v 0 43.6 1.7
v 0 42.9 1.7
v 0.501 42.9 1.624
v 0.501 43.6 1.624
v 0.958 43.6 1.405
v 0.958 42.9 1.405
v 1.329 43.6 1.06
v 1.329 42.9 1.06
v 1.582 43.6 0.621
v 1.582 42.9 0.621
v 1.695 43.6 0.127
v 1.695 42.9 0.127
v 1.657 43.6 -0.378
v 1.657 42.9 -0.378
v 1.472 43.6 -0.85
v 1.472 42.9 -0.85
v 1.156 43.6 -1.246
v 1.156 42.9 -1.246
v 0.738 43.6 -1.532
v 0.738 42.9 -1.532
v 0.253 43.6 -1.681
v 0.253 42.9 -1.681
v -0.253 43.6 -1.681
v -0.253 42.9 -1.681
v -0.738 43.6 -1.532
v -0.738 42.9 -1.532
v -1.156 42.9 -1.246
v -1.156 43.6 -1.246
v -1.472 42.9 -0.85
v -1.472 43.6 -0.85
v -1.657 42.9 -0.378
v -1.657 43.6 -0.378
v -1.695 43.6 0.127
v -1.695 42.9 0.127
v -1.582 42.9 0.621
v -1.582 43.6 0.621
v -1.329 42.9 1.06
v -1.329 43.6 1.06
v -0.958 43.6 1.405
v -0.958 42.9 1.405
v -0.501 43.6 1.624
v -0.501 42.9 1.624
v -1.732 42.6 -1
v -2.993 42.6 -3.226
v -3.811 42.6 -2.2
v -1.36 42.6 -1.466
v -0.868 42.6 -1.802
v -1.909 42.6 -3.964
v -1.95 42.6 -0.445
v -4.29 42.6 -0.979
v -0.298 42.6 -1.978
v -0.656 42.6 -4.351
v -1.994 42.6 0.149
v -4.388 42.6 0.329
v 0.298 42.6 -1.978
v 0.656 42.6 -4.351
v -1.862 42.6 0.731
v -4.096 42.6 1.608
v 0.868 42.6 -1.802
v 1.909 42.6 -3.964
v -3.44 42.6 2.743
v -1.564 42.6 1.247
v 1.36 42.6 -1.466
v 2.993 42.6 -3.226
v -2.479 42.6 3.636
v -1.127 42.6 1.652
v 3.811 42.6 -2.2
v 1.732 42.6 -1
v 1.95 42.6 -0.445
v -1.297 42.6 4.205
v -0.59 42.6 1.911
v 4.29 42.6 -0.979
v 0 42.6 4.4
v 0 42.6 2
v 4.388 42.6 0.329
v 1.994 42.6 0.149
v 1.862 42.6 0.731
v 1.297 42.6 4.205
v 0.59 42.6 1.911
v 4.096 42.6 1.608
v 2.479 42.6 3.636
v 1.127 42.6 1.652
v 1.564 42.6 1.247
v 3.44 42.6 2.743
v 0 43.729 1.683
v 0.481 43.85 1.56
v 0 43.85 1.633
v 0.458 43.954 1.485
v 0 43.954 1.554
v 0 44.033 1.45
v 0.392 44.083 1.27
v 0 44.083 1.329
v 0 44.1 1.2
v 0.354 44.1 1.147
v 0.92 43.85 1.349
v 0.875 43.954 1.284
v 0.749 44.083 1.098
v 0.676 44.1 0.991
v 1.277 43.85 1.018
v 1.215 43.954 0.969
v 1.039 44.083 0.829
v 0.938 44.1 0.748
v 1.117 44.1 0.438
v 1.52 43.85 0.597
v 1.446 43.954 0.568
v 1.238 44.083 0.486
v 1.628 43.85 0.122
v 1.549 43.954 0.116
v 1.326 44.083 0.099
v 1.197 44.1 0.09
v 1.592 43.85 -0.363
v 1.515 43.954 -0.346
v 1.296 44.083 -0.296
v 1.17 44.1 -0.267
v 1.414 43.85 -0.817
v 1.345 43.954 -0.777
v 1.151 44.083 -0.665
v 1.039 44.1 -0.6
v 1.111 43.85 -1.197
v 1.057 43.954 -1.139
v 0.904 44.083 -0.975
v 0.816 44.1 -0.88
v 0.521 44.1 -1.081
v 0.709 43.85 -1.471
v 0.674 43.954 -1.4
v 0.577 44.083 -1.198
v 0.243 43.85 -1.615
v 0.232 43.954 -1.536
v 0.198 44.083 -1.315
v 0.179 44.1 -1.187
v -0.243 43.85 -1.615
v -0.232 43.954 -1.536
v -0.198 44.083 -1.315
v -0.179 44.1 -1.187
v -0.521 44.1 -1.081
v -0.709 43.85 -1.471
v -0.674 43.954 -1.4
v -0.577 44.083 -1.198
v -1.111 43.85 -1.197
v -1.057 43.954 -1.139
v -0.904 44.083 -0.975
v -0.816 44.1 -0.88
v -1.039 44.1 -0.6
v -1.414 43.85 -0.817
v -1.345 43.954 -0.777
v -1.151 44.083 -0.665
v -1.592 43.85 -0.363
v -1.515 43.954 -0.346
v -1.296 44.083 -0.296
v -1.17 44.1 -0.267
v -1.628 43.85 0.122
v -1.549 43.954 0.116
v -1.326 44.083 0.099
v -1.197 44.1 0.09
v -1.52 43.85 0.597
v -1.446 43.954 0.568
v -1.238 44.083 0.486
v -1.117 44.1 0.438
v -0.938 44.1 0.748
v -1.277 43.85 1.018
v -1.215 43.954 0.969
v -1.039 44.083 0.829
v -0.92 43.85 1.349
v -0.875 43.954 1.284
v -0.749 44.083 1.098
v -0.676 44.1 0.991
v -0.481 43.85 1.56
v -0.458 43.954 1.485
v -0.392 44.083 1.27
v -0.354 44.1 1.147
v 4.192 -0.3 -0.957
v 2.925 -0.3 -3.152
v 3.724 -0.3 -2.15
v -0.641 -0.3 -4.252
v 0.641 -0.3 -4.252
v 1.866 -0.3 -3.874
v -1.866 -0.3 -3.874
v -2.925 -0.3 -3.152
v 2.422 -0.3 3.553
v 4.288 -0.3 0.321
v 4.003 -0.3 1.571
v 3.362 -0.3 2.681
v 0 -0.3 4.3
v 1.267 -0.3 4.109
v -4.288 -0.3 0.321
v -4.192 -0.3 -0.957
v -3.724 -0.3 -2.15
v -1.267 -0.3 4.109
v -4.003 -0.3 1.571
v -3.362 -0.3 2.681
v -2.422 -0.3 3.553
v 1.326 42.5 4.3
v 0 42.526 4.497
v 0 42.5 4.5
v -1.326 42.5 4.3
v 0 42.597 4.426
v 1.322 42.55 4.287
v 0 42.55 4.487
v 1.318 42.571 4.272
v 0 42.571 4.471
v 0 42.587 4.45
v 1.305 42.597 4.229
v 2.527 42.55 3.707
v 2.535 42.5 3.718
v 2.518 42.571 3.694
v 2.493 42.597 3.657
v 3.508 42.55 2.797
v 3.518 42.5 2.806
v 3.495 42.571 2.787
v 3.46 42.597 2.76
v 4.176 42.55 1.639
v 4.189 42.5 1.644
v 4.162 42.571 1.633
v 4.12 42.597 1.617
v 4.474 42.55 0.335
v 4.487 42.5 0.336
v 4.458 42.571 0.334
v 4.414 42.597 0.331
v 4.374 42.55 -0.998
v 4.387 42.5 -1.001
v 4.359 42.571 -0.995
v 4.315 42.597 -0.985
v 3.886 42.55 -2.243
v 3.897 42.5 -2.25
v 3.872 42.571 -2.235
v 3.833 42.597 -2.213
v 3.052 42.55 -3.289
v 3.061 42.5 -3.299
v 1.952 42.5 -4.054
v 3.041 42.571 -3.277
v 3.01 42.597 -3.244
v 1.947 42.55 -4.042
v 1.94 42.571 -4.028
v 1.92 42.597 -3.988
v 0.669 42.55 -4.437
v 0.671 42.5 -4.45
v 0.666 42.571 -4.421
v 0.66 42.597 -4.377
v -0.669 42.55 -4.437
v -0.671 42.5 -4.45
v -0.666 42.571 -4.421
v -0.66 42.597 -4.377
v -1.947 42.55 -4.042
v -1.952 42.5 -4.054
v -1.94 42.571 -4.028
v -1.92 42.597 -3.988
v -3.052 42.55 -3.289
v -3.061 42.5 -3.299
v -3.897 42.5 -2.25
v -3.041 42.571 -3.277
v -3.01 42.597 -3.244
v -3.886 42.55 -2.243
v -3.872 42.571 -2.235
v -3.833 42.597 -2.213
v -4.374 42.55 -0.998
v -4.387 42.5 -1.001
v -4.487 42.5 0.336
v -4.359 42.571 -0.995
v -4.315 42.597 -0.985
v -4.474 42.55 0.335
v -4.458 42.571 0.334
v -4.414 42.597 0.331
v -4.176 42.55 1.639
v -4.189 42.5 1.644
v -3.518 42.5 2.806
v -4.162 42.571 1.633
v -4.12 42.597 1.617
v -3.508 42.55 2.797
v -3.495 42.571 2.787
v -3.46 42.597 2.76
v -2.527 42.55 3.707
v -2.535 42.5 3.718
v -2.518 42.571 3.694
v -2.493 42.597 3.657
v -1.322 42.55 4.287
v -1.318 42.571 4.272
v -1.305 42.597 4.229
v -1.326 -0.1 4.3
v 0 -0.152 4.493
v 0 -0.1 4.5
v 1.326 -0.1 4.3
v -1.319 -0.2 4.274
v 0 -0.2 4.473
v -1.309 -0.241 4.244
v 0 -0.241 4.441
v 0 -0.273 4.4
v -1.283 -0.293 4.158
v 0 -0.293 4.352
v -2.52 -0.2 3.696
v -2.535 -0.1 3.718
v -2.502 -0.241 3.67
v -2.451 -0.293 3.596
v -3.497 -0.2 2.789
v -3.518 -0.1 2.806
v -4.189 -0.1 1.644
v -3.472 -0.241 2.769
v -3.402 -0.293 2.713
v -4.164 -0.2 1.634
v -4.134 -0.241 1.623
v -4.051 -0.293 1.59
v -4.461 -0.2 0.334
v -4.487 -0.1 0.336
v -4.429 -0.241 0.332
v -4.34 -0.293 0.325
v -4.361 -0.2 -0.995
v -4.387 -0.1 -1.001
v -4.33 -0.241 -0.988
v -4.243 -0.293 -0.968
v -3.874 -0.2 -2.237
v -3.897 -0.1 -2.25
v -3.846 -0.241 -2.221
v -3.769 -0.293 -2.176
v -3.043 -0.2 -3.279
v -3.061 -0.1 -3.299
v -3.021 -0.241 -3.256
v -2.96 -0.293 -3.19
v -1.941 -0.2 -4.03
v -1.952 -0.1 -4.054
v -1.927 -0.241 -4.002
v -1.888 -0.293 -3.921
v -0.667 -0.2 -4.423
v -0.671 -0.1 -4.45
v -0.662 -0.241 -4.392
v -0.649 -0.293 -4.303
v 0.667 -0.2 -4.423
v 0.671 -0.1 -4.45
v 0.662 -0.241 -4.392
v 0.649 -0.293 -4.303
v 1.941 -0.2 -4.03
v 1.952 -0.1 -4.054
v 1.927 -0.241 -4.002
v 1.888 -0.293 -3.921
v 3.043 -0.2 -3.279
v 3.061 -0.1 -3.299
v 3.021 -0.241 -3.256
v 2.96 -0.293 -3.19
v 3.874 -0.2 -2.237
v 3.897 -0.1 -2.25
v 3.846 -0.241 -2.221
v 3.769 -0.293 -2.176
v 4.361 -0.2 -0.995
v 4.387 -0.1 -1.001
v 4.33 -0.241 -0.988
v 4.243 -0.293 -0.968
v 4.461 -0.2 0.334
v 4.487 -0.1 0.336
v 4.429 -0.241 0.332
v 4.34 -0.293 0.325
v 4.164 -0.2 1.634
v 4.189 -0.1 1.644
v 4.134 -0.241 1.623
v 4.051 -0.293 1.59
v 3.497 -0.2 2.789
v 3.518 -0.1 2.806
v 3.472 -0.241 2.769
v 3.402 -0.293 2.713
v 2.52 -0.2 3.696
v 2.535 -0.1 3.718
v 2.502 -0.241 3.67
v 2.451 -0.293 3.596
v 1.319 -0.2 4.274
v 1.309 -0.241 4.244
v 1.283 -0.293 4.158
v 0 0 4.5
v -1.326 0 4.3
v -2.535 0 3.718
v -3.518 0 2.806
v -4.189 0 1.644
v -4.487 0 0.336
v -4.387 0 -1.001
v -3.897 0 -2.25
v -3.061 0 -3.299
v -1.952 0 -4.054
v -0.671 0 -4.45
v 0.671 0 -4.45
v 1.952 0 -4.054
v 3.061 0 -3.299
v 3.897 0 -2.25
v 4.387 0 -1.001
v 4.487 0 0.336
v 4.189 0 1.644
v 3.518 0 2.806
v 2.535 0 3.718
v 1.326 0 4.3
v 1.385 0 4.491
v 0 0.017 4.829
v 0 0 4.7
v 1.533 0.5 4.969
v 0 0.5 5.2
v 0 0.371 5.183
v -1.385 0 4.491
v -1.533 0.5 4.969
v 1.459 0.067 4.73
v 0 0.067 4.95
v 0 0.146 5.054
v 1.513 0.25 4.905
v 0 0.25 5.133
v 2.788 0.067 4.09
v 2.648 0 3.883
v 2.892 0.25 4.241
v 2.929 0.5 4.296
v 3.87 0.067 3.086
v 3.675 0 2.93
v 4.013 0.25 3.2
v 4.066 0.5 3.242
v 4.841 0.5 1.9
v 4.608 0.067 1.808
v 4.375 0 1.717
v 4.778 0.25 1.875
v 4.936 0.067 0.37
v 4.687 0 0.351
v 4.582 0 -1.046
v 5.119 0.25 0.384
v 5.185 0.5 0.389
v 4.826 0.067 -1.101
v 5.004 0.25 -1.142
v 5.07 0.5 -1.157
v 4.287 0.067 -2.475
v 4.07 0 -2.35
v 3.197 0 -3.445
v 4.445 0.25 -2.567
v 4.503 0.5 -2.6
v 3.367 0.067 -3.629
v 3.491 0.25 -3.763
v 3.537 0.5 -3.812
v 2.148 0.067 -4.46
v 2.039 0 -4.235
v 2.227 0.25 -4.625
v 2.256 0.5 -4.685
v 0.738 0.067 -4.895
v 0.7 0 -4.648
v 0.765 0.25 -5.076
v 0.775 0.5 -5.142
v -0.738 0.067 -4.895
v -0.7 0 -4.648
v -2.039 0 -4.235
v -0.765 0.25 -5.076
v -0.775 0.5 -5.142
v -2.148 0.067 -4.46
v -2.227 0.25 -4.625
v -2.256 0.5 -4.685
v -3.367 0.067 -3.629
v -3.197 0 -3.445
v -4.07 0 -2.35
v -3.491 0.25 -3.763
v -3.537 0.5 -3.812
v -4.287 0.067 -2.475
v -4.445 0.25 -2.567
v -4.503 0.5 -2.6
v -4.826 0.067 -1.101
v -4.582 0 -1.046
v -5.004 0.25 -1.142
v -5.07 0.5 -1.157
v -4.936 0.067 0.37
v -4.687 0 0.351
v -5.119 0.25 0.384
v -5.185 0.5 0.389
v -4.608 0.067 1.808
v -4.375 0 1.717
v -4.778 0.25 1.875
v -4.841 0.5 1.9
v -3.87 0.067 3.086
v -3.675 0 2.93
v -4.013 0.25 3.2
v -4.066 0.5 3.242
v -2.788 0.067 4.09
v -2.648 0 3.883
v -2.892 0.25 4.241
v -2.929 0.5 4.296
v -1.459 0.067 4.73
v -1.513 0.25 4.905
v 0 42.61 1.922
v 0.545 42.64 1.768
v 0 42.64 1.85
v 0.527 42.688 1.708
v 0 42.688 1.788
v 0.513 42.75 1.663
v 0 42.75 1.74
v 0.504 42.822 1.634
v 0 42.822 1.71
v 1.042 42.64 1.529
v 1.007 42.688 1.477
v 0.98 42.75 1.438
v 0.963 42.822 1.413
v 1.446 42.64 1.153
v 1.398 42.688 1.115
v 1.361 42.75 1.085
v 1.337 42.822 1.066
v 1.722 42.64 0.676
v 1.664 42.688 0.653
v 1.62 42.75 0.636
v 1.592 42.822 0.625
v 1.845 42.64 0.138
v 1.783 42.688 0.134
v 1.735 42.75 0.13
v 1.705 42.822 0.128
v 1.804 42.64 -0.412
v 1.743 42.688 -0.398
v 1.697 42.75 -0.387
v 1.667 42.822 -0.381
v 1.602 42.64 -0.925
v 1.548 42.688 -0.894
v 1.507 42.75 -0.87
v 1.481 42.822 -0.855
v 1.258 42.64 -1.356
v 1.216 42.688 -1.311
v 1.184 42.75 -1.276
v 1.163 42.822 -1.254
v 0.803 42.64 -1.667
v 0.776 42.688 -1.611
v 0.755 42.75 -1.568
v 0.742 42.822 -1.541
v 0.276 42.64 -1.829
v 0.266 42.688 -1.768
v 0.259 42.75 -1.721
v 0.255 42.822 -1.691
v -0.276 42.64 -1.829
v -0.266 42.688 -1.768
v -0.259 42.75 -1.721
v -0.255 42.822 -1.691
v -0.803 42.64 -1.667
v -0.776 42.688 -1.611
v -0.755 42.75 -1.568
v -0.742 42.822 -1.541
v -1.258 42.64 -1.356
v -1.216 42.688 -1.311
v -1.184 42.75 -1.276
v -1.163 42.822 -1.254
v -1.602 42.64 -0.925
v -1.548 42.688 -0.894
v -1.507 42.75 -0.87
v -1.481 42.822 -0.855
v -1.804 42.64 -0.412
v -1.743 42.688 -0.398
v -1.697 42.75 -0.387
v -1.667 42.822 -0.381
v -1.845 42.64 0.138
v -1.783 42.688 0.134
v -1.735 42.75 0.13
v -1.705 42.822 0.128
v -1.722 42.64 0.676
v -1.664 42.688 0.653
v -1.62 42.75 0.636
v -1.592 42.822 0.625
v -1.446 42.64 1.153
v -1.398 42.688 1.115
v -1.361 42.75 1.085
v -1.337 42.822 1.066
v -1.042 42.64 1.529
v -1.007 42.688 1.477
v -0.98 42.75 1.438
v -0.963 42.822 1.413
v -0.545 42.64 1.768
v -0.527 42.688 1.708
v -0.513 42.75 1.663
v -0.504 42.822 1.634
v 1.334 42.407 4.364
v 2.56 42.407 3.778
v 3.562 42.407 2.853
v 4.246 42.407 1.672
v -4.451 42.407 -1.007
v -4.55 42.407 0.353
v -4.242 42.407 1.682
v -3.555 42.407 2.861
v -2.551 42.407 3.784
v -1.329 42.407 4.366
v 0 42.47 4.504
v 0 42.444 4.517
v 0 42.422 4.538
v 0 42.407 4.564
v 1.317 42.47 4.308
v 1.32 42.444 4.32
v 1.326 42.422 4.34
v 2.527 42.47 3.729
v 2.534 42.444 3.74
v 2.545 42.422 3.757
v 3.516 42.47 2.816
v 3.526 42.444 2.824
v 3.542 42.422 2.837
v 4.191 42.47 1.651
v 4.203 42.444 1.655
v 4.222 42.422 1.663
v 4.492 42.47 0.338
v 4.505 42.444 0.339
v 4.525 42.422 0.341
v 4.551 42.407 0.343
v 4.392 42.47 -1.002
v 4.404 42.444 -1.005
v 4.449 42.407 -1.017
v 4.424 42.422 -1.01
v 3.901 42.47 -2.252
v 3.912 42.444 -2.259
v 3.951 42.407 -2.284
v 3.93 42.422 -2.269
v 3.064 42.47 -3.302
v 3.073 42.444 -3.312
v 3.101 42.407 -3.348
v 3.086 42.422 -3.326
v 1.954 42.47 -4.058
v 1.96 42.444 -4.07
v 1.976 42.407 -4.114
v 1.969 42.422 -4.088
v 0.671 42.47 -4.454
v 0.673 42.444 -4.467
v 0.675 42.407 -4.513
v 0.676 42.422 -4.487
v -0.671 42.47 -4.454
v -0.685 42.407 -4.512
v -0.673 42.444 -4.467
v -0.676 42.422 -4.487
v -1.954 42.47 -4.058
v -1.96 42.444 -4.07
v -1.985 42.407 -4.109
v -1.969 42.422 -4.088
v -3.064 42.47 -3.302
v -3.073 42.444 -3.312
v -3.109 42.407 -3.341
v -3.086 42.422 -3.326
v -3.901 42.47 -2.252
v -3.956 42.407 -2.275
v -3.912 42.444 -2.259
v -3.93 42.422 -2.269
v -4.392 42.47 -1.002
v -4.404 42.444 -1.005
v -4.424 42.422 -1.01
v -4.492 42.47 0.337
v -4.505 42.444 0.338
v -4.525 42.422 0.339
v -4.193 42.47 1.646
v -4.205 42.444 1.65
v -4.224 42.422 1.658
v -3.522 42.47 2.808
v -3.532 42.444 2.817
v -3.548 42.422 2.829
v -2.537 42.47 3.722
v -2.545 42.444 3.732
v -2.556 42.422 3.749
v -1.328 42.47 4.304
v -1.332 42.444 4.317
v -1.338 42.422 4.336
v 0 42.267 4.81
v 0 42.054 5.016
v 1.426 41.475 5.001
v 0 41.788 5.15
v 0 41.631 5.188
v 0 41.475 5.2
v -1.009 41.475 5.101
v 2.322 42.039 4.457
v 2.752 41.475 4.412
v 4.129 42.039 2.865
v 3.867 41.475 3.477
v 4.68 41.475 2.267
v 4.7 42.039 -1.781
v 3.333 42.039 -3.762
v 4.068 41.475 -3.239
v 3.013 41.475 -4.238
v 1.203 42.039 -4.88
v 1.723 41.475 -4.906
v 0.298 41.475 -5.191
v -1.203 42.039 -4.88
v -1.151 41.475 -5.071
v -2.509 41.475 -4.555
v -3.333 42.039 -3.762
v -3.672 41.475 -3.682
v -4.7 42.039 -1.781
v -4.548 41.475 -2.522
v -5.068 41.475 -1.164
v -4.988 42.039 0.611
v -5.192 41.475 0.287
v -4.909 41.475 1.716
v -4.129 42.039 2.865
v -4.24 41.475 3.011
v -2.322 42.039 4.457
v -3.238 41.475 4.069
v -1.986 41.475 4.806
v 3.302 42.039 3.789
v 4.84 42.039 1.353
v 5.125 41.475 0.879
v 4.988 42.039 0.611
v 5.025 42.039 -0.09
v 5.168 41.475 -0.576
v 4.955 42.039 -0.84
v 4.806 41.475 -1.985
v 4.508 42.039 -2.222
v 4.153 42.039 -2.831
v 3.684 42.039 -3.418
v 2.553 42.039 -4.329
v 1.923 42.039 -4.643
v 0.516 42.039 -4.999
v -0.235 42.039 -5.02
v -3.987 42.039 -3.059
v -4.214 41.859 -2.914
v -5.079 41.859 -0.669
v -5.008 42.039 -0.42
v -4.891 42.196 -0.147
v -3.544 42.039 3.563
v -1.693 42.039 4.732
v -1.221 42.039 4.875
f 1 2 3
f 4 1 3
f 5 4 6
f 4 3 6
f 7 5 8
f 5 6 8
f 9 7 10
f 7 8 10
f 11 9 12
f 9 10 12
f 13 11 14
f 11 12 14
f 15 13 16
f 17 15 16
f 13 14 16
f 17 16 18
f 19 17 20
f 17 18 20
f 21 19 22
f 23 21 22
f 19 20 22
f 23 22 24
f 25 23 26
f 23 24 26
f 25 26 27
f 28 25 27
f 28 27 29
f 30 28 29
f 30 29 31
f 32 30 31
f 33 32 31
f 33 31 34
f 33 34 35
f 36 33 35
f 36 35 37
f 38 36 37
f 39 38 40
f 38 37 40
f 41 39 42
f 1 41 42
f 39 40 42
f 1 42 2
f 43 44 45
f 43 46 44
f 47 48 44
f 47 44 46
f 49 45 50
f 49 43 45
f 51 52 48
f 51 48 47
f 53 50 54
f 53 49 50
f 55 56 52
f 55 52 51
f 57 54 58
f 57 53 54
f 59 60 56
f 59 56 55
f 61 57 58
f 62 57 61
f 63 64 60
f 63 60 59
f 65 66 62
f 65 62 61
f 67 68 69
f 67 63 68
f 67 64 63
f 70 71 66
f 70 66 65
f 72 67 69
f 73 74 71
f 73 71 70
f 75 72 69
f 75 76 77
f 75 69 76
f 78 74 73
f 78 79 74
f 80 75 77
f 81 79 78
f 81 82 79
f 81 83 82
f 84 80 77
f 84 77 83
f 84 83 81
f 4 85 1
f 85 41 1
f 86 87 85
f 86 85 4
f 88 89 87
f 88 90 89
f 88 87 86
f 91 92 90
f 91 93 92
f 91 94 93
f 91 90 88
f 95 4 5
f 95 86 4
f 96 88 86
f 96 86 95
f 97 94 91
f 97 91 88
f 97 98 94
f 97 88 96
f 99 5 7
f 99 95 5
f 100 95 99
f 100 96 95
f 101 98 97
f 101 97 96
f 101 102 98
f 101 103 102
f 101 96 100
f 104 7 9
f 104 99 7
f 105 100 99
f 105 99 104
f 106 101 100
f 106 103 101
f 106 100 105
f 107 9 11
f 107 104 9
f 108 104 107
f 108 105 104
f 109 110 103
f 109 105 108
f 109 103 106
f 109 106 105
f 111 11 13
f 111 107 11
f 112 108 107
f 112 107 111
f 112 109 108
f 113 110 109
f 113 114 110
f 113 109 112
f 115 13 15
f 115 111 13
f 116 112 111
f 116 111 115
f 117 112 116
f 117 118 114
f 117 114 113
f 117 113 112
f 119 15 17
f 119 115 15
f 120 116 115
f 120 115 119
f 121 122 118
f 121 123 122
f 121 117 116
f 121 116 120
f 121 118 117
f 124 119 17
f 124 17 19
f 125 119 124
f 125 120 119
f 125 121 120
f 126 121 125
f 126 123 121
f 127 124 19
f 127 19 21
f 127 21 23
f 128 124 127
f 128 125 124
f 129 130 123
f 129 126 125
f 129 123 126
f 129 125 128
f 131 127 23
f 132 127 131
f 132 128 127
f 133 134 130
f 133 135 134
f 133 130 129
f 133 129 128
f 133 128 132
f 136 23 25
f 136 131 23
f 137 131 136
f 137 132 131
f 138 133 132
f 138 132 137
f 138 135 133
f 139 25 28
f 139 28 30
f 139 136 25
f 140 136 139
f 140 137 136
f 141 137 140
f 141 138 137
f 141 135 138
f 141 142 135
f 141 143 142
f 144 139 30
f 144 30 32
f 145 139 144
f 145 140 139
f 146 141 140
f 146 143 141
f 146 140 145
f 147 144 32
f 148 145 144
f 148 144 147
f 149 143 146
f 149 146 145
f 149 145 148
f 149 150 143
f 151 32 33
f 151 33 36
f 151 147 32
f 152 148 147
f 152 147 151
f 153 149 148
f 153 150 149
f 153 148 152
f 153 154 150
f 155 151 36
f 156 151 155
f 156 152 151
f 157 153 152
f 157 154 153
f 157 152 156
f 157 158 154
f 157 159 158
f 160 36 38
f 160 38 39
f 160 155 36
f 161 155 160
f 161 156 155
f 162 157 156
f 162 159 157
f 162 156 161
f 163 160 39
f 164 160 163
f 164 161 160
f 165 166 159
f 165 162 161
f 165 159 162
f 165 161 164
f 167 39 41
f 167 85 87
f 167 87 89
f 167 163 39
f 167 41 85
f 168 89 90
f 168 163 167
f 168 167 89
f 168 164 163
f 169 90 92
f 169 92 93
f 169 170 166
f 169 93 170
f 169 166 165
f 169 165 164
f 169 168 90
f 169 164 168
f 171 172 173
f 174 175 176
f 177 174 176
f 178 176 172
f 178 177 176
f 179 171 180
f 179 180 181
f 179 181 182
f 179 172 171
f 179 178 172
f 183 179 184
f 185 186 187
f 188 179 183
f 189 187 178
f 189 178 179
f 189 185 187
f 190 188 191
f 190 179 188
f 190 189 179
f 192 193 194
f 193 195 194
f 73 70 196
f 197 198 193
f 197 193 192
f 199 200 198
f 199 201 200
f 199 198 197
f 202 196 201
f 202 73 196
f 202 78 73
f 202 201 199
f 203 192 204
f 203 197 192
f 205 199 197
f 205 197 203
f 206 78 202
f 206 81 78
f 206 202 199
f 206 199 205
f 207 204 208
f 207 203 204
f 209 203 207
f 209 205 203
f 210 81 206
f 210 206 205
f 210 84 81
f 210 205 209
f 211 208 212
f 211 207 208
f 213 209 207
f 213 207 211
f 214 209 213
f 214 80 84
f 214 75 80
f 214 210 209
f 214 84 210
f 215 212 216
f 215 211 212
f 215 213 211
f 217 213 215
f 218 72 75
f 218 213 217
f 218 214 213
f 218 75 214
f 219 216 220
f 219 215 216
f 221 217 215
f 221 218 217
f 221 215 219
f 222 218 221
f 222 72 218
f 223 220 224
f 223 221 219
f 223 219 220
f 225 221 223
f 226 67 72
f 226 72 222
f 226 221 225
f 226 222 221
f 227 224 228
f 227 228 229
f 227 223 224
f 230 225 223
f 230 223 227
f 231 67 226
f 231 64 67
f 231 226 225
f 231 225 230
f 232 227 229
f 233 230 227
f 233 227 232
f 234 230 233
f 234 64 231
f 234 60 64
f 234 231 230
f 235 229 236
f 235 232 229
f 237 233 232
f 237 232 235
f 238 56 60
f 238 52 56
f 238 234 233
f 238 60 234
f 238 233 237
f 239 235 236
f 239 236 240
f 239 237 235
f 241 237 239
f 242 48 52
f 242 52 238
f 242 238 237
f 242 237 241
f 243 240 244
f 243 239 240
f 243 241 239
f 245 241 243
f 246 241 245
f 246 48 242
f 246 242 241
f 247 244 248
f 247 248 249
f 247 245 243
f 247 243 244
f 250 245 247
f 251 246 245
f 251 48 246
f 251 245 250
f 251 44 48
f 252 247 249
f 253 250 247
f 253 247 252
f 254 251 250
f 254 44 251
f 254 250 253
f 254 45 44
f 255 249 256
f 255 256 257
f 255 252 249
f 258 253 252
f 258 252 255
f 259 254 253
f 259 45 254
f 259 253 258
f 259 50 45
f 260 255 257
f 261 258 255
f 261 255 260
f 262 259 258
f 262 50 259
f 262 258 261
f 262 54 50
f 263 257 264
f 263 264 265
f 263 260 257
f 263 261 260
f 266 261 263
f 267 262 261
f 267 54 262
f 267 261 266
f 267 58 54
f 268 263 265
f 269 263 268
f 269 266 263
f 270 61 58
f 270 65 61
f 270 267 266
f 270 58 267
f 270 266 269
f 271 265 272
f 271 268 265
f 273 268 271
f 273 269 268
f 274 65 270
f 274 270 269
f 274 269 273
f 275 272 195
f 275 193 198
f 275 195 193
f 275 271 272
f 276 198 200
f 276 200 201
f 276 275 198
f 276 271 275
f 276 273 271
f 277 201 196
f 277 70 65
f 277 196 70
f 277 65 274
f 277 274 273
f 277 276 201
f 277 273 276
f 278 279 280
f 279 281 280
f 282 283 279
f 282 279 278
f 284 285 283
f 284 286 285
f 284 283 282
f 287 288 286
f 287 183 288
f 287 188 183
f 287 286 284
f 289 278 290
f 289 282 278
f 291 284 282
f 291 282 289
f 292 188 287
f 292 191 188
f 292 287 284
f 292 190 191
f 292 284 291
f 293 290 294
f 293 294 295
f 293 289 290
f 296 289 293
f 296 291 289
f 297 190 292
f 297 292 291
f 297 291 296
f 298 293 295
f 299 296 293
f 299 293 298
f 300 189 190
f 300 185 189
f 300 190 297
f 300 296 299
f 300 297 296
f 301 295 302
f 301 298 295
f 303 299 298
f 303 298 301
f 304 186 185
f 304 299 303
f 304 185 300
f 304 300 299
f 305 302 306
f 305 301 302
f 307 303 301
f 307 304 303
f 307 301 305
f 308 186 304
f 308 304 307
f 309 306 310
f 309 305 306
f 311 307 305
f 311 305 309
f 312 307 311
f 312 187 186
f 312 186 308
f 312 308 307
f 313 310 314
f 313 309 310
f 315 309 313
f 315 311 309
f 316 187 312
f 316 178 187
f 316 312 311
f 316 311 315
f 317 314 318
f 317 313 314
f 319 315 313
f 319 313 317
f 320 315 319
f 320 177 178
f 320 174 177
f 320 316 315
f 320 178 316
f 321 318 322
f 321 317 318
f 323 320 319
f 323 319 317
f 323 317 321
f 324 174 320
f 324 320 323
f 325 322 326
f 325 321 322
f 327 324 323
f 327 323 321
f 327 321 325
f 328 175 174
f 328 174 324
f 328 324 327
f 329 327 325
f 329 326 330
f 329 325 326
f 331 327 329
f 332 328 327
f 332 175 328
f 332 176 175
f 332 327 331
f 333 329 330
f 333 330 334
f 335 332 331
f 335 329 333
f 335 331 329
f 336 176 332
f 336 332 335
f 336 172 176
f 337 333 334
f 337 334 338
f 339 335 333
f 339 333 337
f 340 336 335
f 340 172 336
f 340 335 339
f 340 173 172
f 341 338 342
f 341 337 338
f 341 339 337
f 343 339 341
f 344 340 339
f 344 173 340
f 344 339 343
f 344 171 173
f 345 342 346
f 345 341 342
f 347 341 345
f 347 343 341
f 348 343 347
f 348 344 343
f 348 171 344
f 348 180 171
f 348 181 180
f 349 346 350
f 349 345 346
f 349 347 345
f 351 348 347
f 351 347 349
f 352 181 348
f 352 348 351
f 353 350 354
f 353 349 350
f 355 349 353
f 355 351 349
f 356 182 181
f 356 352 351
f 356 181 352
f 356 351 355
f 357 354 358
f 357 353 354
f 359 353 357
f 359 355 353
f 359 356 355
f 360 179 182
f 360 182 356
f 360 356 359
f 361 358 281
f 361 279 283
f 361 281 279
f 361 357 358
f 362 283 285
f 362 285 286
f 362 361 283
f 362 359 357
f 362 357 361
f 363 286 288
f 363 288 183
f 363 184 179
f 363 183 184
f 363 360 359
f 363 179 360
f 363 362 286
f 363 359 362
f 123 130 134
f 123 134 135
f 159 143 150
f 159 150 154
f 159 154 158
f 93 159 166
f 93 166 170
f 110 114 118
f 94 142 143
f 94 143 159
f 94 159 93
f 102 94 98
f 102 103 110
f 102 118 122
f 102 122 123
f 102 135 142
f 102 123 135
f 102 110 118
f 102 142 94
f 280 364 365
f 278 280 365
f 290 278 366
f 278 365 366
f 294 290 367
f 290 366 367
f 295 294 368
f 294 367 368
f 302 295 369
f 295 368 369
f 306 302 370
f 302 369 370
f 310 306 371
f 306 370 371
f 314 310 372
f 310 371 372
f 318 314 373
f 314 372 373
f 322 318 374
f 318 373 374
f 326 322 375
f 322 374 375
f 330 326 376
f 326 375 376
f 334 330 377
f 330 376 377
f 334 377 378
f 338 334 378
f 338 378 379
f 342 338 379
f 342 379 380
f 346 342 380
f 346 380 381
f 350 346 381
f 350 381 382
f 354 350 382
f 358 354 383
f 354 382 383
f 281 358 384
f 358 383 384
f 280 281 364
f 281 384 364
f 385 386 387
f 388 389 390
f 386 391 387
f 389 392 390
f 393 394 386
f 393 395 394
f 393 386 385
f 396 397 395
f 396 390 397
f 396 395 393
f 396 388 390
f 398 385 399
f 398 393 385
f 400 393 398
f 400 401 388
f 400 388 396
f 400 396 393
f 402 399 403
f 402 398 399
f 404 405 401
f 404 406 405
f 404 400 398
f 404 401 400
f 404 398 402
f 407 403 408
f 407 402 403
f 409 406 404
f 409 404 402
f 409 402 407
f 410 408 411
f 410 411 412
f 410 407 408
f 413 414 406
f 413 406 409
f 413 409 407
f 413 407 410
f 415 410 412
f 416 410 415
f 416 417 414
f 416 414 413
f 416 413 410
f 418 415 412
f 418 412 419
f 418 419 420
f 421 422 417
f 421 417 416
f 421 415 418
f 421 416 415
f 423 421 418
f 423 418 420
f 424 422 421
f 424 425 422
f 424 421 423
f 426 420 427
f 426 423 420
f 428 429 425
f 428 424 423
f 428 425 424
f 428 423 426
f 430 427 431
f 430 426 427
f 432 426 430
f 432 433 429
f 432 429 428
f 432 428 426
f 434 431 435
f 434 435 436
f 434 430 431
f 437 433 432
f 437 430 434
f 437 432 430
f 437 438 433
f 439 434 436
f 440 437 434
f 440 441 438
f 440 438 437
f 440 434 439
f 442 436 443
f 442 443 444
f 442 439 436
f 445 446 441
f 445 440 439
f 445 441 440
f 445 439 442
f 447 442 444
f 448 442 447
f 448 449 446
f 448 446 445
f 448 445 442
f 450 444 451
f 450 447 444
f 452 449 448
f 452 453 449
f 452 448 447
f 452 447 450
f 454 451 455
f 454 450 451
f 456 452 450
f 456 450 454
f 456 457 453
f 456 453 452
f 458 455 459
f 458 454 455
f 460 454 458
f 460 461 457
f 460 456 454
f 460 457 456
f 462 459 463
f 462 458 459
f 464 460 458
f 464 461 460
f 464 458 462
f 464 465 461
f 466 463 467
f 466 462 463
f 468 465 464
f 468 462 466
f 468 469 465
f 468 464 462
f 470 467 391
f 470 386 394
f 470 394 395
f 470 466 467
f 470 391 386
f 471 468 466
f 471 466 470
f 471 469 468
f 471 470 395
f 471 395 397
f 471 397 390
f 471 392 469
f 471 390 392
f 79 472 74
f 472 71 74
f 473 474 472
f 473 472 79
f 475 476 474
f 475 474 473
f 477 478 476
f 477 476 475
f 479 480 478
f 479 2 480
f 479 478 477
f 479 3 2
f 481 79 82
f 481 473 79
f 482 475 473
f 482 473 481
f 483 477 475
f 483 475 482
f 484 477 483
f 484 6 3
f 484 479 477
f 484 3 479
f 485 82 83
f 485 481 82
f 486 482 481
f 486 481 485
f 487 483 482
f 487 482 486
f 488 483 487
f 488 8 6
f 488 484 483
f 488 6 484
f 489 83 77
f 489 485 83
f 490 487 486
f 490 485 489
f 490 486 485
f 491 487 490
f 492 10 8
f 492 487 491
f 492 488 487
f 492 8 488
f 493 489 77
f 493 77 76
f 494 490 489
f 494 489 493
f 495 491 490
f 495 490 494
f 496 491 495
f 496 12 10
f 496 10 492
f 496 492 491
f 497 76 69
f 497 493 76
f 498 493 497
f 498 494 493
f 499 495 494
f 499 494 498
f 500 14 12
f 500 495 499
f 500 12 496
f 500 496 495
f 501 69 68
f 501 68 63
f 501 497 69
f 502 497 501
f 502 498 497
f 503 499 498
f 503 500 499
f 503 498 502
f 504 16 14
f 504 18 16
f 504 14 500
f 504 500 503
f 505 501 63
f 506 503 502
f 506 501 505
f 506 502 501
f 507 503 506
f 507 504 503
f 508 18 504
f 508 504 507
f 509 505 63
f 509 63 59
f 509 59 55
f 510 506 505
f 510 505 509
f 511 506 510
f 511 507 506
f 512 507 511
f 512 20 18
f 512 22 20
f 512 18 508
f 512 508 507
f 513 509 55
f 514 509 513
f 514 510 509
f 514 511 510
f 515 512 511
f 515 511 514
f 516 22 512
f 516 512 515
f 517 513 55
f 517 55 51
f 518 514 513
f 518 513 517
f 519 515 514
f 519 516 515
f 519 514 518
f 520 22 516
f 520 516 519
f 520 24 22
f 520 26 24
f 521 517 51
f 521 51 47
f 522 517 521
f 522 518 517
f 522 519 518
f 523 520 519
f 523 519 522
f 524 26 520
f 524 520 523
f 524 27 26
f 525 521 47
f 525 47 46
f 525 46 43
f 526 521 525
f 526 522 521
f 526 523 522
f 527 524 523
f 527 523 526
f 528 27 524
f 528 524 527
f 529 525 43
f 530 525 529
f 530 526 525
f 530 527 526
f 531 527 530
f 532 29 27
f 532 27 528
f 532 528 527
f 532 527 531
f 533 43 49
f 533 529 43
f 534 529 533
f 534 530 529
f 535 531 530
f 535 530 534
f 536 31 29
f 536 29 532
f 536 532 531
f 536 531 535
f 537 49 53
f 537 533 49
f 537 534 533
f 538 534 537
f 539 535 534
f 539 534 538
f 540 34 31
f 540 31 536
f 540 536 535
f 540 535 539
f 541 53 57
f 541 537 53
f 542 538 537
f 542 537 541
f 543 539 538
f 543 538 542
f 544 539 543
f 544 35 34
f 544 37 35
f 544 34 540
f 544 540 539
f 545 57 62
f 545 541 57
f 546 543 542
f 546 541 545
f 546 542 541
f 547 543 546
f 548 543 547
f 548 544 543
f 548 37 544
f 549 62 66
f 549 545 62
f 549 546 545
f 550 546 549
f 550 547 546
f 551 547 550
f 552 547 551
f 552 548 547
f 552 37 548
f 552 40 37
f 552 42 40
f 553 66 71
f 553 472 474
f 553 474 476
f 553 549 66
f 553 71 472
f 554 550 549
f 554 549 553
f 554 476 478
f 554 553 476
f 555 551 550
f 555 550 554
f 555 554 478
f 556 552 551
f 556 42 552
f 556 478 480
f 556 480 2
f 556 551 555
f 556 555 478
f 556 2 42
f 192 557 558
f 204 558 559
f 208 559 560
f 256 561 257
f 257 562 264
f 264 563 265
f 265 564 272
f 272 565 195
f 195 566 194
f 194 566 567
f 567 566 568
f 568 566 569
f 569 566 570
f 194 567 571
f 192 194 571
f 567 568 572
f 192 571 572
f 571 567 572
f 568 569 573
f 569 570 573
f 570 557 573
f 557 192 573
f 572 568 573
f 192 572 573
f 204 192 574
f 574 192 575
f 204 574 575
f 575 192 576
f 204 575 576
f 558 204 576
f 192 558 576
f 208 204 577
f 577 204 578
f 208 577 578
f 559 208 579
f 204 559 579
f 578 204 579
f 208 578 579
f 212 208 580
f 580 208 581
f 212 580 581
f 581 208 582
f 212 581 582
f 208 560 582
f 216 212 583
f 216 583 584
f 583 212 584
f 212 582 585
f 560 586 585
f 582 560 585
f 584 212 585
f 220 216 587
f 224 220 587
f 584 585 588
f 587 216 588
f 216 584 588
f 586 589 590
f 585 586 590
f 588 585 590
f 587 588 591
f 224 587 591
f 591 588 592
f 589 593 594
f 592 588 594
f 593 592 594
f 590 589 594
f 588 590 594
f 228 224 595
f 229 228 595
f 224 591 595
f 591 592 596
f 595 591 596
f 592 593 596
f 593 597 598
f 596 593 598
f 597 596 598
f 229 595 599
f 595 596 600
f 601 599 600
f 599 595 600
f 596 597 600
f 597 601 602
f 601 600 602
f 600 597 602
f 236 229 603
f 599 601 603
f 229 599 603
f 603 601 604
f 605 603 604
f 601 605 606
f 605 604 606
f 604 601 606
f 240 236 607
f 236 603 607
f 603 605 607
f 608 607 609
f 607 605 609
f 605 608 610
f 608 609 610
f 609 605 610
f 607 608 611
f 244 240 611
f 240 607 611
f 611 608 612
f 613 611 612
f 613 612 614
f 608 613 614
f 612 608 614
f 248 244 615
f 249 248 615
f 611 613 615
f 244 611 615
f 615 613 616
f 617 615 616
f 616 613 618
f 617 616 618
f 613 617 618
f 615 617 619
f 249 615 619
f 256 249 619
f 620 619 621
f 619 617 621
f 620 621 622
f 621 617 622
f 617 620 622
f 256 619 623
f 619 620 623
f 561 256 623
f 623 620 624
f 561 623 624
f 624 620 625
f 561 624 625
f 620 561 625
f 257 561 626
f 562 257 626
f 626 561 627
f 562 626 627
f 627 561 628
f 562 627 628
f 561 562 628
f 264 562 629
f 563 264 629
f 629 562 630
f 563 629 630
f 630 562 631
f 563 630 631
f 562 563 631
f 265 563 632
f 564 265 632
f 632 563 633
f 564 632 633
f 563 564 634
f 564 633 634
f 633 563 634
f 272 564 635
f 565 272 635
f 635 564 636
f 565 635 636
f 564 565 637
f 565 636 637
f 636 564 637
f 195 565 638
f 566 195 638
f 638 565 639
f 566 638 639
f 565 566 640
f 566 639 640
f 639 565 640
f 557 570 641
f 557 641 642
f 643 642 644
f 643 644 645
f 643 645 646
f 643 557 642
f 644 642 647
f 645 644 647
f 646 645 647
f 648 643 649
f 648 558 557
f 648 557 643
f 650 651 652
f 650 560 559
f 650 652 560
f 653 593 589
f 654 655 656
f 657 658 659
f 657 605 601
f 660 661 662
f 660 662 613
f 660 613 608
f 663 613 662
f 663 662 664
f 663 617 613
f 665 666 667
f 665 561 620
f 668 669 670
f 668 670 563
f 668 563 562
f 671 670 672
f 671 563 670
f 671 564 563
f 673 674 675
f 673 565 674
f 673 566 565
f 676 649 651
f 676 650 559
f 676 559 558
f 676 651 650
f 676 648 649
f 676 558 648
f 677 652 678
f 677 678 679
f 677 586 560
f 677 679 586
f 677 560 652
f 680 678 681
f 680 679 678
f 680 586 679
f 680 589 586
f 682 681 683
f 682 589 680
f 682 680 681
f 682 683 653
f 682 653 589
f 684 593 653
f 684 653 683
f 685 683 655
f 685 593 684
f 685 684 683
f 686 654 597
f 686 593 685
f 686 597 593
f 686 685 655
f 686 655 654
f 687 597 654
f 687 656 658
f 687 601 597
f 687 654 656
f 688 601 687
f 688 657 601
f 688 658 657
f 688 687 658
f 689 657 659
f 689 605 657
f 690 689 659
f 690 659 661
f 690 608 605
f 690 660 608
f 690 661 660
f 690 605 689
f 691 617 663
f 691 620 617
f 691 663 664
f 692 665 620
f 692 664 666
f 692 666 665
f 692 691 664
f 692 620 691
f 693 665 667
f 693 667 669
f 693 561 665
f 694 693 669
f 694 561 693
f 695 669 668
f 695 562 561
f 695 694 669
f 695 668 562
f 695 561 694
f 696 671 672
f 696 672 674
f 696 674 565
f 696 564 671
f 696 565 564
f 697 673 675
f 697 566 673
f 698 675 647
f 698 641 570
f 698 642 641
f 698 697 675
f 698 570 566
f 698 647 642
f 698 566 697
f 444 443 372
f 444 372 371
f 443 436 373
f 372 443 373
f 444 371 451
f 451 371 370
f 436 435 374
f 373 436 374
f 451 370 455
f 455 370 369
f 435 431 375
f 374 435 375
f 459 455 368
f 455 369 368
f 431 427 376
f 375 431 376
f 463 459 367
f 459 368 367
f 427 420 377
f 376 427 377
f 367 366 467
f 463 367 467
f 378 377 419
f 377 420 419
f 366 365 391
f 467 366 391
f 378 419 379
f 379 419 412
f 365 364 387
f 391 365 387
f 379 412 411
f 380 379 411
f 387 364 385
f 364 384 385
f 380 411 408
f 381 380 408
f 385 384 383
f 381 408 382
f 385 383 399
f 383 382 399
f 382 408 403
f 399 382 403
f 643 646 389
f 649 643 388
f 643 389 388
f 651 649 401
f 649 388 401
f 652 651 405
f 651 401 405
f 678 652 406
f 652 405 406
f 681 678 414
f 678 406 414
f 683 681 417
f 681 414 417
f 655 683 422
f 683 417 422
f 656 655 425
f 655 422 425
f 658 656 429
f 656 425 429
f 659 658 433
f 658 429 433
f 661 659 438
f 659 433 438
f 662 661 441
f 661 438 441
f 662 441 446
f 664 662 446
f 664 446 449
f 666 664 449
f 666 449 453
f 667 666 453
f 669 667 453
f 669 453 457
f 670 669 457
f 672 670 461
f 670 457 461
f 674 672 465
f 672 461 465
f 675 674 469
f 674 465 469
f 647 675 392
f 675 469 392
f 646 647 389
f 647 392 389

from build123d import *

# Parameters (mm, degrees)
SKETCH1_R           = 5.2
BOSS_EXTRUDE1_DEPTH = 42.4
SKETCH2_R           = 4.5
BOSS_EXTRUDE2_DEPTH = 0.3
BOSS_EXTRUDE3_START = 0.2
SKETCH3_R           = 4.5
BOSS_EXTRUDE3_DEPTH = 0.2
SKETCH4_R           = 1.7
BOSS_EXTRUDE4_DEPTH = 1.5
FILLET1_R           = 0.5
FILLET2_R           = 0.1
FILLET3_R           = 0.1
FILLET4_R           = 1
FILLET7_R           = 0.3
FILLET8_R           = 0.2
FILLET9_R           = 0.5


with BuildPart() as part:
    # Sketch1 → Boss-Extrude1 (new body)
    with BuildSketch(Plane(origin=(0, 0, 0), x_dir=(1, 0, 0), z_dir=(0, 1, 0))):
        with Locations(Location((0, 0, 0), (0, 0, 270))):
            Circle(SKETCH1_R)
    extrude(amount=BOSS_EXTRUDE1_DEPTH)

    # Sketch2 → Boss-Extrude2 (add)
    with BuildSketch(Plane.XZ):
        with Locations(Location((0, 0, 0), (0, 0, 90))):
            Circle(SKETCH2_R)
    extrude(amount=BOSS_EXTRUDE2_DEPTH)

    # Sketch3 → Boss-Extrude3 (add)
    with BuildSketch(Plane(origin=(0, 42.4, 0), x_dir=(1, 0, 0), z_dir=(0, 1, 0)).offset(BOSS_EXTRUDE3_START)):
        with Locations(Location((0, 0, 0), (0, 0, 270))):
            Circle(SKETCH3_R)
    extrude(amount=-BOSS_EXTRUDE3_DEPTH)

    # Sketch4 → Boss-Extrude4 (add)
    with BuildSketch(Plane(origin=(0, 42.6, 0), x_dir=(1, 0, 0), z_dir=(0, 1, 0))):
        with Locations(Location((0, 0, 0), (0, 0, 270))):
            Circle(SKETCH4_R)
    extrude(amount=BOSS_EXTRUDE4_DEPTH)

    # Fillet1
    fillet1_edges = [part.edges().sort_by_distance(p)[0] for p in [
        (0, 44.1, -1.7),
    ]]
    fillet(fillet1_edges, radius=FILLET1_R)

    # Fillet2
    fillet2_edges = [part.edges().sort_by_distance(p)[0] for p in [
        (0, 42.4, -4.5),
    ]]
    fillet(fillet2_edges, radius=FILLET2_R)

    # Fillet3
    fillet3_edges = [part.edges().sort_by_distance(p)[0] for p in [
        (0, 42.6, -4.5),
    ]]
    fillet(fillet3_edges, radius=FILLET3_R - 0.0001)  # a hair under: the kernel refuses the full size

    # Fillet4
    fillet4_edges = [part.edges().sort_by_distance(p)[0] for p in [
        (0, 42.4, -5.2),
    ]]
    fillet(fillet4_edges, radius=FILLET4_R)

    # Fillet7
    fillet7_edges = [part.edges().sort_by_distance(p)[0] for p in [
        (0, 42.6, -1.7),
    ]]
    fillet(fillet7_edges, radius=FILLET7_R)

    # Fillet8
    fillet8_edges = [part.edges().sort_by_distance(p)[0] for p in [
        (0, -0.3, -4.5),
    ]]
    fillet(fillet8_edges, radius=FILLET8_R)

    # Fillet9
    fillet9_edges = [part.edges().sort_by_distance(p)[0] for p in [
        (0, 0, -5.2),
    ]]
    fillet(fillet9_edges, radius=FILLET9_R)


solid = part.part
